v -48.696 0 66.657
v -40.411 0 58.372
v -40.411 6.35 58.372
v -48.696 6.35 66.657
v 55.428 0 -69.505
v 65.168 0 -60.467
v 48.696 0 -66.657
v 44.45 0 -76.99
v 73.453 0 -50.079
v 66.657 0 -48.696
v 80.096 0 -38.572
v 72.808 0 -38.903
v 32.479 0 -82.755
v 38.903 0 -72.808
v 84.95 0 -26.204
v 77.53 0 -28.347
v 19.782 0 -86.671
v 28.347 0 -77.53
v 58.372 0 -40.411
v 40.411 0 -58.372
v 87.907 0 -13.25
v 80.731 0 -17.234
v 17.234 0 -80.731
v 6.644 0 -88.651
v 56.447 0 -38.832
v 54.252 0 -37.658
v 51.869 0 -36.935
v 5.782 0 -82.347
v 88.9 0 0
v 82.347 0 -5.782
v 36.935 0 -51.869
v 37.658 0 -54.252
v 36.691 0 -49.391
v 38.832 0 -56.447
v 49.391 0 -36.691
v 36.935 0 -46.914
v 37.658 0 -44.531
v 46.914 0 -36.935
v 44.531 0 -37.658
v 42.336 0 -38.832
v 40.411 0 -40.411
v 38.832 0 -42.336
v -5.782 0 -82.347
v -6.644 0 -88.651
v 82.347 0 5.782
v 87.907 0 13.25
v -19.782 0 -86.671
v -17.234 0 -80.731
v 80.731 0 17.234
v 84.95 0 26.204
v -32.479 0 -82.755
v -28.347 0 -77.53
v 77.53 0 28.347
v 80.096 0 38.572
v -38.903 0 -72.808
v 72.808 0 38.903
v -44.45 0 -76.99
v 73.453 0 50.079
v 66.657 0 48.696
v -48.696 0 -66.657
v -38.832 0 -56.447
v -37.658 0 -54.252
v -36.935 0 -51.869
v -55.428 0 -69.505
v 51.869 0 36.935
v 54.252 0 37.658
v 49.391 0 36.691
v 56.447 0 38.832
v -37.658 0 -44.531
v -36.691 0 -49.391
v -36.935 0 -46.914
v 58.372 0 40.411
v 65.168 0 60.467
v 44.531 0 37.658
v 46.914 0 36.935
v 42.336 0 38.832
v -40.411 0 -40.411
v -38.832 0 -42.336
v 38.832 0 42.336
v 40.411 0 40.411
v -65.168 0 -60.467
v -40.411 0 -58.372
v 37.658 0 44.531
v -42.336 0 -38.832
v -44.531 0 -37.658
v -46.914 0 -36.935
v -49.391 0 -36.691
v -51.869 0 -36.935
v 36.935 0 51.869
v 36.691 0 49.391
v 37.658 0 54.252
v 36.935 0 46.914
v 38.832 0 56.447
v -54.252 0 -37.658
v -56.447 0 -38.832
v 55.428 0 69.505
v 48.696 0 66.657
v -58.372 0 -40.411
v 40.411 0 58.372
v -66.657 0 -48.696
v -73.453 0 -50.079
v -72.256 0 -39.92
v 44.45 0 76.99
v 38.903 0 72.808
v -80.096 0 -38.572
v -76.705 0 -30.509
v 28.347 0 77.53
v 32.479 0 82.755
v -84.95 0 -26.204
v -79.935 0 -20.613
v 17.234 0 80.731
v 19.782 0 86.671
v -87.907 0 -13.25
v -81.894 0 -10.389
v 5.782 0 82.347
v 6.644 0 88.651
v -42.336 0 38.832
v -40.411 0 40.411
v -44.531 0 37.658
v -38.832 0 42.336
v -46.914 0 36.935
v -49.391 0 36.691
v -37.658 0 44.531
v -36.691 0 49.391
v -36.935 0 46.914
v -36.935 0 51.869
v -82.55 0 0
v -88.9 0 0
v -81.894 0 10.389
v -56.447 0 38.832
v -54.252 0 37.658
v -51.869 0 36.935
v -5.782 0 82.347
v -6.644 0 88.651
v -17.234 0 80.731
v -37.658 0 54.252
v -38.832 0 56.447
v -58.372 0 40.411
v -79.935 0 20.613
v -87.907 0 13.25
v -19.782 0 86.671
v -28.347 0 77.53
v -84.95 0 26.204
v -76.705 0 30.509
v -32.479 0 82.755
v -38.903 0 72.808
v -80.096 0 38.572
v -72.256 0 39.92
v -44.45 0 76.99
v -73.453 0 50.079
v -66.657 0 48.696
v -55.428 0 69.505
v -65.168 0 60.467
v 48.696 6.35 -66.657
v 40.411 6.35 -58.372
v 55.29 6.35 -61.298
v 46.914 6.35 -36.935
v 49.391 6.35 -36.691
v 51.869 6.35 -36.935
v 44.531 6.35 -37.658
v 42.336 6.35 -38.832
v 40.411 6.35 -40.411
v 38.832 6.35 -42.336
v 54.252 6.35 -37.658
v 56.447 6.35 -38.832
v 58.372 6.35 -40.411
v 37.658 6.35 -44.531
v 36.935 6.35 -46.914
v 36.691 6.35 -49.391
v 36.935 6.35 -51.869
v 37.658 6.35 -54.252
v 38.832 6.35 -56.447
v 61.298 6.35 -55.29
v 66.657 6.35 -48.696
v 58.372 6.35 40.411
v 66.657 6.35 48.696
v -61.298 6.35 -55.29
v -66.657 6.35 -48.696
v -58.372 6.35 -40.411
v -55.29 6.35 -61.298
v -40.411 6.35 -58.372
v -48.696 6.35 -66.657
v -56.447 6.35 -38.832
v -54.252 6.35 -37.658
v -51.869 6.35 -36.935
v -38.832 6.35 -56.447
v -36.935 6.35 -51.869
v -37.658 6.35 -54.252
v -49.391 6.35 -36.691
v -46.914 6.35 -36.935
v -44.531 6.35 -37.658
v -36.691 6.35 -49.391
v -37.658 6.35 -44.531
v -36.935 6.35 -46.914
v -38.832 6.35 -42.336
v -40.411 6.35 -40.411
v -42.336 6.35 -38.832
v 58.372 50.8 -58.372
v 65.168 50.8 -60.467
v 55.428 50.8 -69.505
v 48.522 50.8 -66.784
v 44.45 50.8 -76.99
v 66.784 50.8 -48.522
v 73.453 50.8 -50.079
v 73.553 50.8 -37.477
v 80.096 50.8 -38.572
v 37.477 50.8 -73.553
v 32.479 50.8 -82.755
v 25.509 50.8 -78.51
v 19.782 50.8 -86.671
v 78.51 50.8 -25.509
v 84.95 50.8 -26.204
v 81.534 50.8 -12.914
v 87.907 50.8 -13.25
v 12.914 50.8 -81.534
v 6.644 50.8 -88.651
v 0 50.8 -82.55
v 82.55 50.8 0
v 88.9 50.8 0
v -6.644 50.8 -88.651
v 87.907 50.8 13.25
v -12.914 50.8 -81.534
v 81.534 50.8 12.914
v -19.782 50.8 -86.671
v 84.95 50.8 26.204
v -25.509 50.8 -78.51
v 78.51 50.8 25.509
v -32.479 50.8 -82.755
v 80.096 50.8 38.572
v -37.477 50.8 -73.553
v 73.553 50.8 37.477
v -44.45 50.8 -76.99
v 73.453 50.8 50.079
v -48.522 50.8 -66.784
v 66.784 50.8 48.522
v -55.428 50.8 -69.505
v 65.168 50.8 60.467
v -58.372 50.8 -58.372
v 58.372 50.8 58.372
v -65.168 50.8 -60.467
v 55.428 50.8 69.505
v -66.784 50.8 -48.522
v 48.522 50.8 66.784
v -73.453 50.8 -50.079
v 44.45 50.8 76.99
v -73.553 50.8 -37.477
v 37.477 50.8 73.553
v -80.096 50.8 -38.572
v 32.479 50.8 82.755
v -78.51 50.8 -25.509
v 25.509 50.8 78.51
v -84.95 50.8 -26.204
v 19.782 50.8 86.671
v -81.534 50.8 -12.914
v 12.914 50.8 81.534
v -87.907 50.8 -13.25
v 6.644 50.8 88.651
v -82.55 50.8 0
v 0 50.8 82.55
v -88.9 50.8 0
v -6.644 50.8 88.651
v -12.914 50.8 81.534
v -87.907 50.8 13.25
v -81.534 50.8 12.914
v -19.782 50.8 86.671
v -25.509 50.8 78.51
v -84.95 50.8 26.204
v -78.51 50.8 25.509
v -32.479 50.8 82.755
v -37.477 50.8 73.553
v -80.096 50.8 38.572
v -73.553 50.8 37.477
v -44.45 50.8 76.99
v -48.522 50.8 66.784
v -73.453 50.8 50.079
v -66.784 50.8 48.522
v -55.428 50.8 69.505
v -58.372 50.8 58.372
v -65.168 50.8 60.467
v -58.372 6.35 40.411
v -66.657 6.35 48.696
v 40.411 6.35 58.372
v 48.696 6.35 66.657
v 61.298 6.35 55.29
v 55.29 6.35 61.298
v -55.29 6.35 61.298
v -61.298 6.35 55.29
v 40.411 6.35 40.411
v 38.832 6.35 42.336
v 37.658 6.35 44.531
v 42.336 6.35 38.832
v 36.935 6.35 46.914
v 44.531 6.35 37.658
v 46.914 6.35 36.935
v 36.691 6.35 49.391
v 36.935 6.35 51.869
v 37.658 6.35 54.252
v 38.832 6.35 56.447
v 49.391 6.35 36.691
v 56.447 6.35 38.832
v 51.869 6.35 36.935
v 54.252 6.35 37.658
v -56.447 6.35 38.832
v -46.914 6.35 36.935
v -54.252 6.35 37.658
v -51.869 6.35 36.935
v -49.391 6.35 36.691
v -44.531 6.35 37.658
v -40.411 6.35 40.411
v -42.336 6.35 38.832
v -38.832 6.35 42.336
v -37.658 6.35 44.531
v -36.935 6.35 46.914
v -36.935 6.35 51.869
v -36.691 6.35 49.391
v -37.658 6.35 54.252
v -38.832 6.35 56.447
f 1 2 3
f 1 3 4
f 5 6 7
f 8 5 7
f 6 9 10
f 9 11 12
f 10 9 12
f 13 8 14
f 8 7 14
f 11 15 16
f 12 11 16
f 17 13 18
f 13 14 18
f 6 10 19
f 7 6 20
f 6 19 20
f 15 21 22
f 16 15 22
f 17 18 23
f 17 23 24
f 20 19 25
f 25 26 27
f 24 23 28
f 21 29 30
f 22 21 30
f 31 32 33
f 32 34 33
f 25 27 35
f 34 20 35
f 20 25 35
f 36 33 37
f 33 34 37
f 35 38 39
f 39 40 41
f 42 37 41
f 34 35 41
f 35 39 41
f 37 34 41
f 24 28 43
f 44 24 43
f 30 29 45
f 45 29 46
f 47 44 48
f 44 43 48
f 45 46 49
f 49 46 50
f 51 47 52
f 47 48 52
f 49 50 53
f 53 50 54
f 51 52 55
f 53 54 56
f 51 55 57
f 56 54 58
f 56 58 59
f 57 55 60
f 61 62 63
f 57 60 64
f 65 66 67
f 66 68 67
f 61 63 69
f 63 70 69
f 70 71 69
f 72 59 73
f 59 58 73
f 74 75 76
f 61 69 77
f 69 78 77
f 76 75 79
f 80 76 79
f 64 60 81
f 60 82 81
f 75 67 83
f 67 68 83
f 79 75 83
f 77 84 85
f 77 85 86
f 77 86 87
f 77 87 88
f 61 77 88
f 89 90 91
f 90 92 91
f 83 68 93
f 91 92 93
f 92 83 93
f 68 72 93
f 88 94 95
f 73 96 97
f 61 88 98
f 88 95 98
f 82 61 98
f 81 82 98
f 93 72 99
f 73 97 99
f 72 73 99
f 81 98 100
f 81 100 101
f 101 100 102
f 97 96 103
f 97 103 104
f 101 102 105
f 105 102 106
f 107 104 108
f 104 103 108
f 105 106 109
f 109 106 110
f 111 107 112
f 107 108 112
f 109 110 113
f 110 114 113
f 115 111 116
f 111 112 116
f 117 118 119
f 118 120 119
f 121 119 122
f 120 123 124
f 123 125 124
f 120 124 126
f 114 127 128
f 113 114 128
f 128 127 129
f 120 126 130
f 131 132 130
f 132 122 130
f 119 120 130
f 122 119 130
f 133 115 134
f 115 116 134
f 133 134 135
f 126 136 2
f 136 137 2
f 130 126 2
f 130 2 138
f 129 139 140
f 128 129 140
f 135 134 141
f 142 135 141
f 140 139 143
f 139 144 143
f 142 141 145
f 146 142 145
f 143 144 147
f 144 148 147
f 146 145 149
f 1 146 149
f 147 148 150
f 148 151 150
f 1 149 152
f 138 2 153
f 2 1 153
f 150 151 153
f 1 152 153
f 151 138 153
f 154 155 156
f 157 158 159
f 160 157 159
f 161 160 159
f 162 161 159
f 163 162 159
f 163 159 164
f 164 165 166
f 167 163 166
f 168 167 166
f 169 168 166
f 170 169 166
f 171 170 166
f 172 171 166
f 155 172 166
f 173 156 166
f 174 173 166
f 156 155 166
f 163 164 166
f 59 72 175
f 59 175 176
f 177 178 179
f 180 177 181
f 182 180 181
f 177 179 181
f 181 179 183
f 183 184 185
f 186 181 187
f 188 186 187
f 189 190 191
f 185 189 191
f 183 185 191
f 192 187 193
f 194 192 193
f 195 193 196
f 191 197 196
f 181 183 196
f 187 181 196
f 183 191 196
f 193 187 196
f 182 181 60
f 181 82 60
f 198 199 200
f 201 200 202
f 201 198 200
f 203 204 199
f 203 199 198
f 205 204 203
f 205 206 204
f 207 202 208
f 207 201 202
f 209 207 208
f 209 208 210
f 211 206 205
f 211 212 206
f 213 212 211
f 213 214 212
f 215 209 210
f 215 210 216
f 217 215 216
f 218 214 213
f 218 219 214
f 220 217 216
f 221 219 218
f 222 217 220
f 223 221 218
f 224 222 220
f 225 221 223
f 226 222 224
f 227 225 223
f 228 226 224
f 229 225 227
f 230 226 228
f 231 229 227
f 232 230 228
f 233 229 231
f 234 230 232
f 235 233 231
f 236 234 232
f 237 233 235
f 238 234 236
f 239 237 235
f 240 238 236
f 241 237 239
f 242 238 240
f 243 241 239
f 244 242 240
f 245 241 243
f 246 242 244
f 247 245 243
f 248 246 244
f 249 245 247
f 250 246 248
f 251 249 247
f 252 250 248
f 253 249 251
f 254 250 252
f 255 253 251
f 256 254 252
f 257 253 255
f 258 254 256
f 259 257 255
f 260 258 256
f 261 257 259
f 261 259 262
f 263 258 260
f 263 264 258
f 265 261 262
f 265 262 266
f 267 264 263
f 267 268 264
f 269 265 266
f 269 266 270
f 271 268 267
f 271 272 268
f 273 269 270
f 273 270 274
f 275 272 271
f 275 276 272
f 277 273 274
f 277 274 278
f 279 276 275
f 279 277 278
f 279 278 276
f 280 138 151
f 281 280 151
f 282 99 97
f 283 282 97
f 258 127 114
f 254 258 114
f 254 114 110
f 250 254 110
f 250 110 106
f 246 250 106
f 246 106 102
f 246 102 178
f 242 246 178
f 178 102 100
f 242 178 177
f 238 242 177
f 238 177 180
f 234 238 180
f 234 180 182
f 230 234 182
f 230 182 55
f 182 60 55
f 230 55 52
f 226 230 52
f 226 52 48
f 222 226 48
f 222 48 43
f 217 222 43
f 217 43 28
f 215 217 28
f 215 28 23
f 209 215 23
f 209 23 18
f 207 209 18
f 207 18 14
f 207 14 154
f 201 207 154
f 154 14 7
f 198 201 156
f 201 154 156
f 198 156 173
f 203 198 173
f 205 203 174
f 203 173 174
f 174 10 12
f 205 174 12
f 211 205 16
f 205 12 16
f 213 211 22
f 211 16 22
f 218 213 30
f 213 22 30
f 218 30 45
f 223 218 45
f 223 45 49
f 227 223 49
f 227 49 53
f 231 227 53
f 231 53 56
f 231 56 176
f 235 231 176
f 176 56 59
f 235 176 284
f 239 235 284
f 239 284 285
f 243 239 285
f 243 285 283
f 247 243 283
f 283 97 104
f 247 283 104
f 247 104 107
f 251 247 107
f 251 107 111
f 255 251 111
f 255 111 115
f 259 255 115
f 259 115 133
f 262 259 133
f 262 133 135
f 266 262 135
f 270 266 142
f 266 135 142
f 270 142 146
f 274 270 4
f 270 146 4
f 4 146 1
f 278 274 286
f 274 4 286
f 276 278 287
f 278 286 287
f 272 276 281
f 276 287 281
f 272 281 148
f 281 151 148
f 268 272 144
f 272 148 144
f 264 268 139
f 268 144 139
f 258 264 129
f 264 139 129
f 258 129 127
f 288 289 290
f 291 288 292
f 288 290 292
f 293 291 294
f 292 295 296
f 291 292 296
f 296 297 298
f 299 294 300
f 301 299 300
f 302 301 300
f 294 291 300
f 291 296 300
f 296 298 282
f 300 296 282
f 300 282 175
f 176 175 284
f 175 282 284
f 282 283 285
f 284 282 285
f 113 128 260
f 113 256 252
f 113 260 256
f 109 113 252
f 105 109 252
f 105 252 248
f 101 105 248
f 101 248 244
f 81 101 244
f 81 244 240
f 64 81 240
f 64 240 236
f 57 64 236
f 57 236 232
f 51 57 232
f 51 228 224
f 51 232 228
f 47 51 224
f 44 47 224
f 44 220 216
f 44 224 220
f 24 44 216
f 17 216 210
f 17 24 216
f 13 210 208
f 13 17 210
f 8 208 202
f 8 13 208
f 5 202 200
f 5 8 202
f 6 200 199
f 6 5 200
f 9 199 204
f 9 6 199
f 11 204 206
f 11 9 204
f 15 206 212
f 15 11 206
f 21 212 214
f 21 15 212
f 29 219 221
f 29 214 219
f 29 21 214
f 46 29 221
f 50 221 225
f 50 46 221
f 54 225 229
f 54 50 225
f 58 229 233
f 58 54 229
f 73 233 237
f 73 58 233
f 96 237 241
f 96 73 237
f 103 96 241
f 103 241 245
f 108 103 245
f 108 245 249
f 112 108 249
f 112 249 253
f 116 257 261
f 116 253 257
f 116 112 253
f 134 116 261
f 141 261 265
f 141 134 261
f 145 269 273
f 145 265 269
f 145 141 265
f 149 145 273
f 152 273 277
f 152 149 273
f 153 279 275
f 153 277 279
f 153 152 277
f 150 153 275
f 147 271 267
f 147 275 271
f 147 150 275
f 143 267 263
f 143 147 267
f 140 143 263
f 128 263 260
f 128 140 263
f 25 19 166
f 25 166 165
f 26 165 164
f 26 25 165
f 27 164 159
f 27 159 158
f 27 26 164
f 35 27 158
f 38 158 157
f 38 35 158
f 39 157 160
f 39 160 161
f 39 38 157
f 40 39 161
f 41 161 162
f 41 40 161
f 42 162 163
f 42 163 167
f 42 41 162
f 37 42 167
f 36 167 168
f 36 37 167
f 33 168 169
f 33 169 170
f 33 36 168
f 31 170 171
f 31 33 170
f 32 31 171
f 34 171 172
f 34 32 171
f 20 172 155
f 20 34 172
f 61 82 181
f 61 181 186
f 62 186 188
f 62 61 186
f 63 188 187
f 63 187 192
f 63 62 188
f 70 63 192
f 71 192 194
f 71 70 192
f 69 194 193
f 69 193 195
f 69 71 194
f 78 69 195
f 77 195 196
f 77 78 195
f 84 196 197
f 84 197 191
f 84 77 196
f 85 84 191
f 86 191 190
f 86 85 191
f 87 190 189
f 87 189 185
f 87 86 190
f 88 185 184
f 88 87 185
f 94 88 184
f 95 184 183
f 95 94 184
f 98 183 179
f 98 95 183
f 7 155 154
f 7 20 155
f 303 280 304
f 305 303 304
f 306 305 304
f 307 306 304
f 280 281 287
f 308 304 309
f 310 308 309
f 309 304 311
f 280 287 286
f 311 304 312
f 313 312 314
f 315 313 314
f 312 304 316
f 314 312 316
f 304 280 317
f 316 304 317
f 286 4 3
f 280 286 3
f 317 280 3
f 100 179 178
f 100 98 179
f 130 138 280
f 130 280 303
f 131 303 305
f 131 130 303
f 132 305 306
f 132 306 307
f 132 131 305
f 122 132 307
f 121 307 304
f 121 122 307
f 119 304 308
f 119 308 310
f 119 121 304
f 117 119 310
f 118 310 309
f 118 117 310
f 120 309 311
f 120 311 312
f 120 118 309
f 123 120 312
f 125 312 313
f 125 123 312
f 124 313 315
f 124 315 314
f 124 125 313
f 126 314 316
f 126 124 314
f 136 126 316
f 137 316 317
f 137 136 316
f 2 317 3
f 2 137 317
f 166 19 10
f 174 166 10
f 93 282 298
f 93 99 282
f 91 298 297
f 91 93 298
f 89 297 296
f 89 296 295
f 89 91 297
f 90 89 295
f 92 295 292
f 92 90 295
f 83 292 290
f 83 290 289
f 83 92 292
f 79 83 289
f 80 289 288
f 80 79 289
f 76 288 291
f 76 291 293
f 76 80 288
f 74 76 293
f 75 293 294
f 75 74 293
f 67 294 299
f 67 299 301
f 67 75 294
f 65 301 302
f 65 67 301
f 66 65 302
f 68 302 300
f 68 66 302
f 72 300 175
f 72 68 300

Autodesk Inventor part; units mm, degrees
ref_plane "YZ Plane" through (0, 0, 0) normal (1, 0, 0) x (0, 1, 0)
ref_plane "XZ Plane" through (0, 0, 0) normal (0, 1, 0) x (-1, 0, 0)
ref_plane "XY Plane" through (0, 0, 0) normal (0, 0, 1) x (1, 0, 0)
sketch "Sketch1" plane through (0, 0, 0) normal (0, 1, 0) x (-1, 0, 0)
  circle A0 centre (0, 0) radius 82.55
  circle A1 centre (0, 0) radius 88.9
  dimension "d0" = 165.1
  dimension "d1" = 177.8
extrude "Extrusion1" add sketch "Sketch1" along normal blind 50.8
sketch "Sketch2" plane through (0, 0, 0) normal (0, -1, 0) x (1, 0, 0)
  arc A0 (40.4112, 58.3717) -> (58.3717, 40.4112) centre (49.3914, 49.3914) ccw
  arc A1 (58.3717, -40.4112) -> (40.4112, -58.3717) centre (49.3914, -49.3914) ccw
  arc A2 (-40.4112, -58.3717) -> (-58.3717, -40.4112) centre (-49.3914, -49.3914) ccw
  arc A3 (-58.3717, 40.4112) -> (-40.4112, 58.3717) centre (-49.3914, 49.3914) ccw
  circle A4 centre (0, 0) radius 82.55 projected
  line L0 (-40.4112, 58.3717) -> (-48.6965, 66.657)
  line L1 (-58.3717, 40.4112) -> (-66.657, 48.6965)
  line L2 (58.3717, 40.4112) -> (66.657, 48.6965)
  line L3 (40.4112, 58.3717) -> (48.6965, 66.657)
  line L4 (58.3717, -40.4112) -> (66.657, -48.6965)
  line L5 (40.4112, -58.3717) -> (48.6965, -66.657)
  line L6 (-40.4112, -58.3717) -> (-48.6965, -66.657)
  line L7 (-58.3717, -40.4112) -> (-66.657, -48.6965)
  dimension "d4" = 25.4
extrude "Extrusion2" add sketch "Sketch2" against normal blind 6.35 contours L3 A4 L2 A0 | L0 A3 L1 A4 | A4 L5 A1 L4 | L7 A2 L6 A4
properties part number "aluminumMount" material "Aluminum 6061-AHC"
